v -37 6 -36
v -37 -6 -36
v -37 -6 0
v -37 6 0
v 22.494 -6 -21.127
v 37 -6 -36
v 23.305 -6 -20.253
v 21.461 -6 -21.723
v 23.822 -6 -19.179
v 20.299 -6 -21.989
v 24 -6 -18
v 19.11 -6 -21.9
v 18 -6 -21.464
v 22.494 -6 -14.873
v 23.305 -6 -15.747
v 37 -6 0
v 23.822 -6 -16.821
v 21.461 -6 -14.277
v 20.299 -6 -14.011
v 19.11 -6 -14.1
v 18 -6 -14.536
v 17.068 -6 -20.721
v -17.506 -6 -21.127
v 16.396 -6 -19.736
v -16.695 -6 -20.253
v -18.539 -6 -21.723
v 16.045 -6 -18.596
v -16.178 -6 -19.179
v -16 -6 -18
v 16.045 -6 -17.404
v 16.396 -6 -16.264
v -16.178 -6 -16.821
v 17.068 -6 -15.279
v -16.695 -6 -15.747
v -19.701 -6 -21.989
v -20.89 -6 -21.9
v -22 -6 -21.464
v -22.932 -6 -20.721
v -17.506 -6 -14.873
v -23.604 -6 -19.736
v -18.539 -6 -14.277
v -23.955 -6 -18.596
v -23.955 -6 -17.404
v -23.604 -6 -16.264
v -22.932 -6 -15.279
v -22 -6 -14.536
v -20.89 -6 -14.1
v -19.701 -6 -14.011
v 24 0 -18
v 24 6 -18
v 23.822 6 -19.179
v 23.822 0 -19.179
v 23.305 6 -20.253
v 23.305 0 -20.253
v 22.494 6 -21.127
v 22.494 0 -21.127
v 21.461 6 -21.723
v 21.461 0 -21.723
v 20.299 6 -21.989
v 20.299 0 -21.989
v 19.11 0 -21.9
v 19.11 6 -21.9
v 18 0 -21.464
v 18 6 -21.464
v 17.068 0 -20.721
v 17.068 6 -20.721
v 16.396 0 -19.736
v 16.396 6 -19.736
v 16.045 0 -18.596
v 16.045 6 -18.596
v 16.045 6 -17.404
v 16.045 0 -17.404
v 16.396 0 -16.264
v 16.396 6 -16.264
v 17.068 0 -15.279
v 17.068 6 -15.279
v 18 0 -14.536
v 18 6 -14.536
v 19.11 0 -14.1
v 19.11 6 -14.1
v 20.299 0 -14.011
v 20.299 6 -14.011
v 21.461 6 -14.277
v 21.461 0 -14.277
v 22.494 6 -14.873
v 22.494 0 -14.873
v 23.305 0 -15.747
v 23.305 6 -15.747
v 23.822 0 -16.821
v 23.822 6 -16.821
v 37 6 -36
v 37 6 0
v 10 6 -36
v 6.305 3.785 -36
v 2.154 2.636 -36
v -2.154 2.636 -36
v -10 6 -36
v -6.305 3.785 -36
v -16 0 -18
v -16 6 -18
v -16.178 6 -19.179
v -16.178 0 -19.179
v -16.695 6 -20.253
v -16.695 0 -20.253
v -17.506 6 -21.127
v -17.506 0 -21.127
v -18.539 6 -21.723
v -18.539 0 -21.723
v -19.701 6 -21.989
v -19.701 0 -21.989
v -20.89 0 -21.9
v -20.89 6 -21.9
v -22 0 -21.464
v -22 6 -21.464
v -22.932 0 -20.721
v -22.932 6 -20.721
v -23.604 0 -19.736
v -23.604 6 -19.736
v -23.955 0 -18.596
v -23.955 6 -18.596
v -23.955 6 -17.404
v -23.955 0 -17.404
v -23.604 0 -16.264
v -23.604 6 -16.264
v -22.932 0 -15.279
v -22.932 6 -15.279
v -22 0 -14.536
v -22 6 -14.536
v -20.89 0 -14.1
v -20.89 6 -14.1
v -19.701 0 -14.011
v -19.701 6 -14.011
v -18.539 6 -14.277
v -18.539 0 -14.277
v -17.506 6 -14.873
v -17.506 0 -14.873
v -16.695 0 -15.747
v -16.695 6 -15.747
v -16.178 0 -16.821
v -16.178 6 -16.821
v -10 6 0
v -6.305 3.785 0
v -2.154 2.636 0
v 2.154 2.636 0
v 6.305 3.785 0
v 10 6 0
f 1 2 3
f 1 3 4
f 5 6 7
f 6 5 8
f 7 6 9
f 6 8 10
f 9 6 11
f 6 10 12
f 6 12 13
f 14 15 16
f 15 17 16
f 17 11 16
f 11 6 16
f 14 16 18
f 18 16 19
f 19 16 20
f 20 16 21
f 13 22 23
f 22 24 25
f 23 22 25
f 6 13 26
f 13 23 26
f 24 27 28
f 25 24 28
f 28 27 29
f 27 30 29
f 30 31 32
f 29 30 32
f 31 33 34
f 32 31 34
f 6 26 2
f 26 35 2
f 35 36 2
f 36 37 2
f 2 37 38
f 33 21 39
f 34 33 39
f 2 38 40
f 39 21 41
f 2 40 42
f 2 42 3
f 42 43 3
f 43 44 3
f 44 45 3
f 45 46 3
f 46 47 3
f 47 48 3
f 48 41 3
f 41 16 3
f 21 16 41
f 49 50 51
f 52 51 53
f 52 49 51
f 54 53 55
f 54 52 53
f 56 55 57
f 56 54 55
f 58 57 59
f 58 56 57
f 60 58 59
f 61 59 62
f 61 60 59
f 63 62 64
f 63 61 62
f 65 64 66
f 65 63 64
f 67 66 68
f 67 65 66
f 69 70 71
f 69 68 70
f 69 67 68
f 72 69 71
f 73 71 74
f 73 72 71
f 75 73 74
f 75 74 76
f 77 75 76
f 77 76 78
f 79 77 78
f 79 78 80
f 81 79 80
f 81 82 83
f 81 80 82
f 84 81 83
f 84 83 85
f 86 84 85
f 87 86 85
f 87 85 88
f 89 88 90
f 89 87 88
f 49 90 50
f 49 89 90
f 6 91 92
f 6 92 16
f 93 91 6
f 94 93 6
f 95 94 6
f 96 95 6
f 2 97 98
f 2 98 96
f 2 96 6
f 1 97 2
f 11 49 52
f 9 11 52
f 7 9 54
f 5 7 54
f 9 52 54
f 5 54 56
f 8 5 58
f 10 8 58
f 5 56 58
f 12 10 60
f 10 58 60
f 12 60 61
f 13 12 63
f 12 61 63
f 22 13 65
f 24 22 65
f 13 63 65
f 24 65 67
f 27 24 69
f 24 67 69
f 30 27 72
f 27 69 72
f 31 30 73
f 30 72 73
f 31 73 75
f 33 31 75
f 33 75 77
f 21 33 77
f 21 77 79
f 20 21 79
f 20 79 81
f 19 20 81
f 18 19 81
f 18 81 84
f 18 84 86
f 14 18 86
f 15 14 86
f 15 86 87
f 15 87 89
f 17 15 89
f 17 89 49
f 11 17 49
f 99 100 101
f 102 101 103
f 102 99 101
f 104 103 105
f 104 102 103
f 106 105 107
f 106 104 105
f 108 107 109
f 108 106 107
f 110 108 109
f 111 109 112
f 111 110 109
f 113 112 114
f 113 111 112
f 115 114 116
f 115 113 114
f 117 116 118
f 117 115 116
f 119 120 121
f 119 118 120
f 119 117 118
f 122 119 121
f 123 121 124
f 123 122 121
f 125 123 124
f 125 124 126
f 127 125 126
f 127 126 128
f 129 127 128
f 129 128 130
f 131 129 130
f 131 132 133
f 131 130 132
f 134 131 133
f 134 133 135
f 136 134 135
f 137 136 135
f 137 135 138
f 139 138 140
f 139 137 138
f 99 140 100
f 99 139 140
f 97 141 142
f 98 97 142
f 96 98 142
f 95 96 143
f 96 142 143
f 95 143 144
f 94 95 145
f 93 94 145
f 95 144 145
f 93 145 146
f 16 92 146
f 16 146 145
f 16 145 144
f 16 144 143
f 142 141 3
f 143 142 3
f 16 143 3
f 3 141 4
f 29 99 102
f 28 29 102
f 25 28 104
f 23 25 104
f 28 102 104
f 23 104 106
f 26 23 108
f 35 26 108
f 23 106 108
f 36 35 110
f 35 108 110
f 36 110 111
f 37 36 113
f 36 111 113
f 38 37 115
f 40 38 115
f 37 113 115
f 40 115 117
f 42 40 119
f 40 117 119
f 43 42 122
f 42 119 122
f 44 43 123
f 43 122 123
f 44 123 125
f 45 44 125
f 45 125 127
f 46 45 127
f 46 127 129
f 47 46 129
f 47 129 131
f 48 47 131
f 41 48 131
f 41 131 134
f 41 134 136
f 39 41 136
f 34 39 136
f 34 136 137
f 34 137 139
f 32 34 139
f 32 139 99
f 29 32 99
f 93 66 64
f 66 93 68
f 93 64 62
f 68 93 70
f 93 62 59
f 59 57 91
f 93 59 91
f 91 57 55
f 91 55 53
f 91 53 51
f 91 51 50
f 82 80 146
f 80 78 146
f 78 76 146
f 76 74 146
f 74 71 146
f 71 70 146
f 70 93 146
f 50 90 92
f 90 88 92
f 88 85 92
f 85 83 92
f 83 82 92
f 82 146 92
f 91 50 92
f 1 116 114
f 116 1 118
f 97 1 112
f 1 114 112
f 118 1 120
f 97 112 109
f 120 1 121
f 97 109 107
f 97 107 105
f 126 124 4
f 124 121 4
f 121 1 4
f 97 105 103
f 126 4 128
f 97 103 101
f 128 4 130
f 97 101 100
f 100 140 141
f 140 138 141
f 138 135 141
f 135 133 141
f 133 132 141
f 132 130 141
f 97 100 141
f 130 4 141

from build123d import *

# Parameters (mm, degrees)
BOSS_EXTRUDE1_DEPTH = 36
SKETCH2_R           = 4
CUT_EXTRUDE1_DEPTH  = 7
SKETCH3_R           = 4
CUT_EXTRUDE2_DEPTH  = 7


with BuildPart() as part:
    # Sketch1 → Boss-Extrude1 (new body)
    with BuildSketch(Plane.XY):
        with BuildLine():
            Line((10, 6), (37, 6))
            Line((37, 6), (37, -6))
            Line((37, -6), (-37, -6))
            Line((-37, -6), (-37, 6))
            Line((-37, 6), (-10, 6))
            ThreePointArc((-10, 6), (0, 2.489995997), (10, 6))
        make_face()
    extrude(amount=-BOSS_EXTRUDE1_DEPTH)

    # Sketch2 → Cut-Extrude1 (cut, through all)
    with BuildSketch(Plane(origin=(0, 0, 0), x_dir=(1, 0, 0), z_dir=(0, 1, 0))):
        with Locations((-20, 18)):
            Circle(SKETCH2_R)
        with Locations((20, 18)):
            Circle(SKETCH2_R)
    extrude(amount=CUT_EXTRUDE1_DEPTH, mode=Mode.SUBTRACT)

    # Sketch3 → Cut-Extrude2 (cut, through all)
    with BuildSketch(Plane(origin=(0, 0, 0), x_dir=(1, 0, 0), z_dir=(0, 1, 0))):
        with Locations((-20, 18)):
            Circle(SKETCH3_R)
        with Locations((20, 18)):
            Circle(SKETCH3_R)
    extrude(amount=-CUT_EXTRUDE2_DEPTH, mode=Mode.SUBTRACT)


solid = part.part
